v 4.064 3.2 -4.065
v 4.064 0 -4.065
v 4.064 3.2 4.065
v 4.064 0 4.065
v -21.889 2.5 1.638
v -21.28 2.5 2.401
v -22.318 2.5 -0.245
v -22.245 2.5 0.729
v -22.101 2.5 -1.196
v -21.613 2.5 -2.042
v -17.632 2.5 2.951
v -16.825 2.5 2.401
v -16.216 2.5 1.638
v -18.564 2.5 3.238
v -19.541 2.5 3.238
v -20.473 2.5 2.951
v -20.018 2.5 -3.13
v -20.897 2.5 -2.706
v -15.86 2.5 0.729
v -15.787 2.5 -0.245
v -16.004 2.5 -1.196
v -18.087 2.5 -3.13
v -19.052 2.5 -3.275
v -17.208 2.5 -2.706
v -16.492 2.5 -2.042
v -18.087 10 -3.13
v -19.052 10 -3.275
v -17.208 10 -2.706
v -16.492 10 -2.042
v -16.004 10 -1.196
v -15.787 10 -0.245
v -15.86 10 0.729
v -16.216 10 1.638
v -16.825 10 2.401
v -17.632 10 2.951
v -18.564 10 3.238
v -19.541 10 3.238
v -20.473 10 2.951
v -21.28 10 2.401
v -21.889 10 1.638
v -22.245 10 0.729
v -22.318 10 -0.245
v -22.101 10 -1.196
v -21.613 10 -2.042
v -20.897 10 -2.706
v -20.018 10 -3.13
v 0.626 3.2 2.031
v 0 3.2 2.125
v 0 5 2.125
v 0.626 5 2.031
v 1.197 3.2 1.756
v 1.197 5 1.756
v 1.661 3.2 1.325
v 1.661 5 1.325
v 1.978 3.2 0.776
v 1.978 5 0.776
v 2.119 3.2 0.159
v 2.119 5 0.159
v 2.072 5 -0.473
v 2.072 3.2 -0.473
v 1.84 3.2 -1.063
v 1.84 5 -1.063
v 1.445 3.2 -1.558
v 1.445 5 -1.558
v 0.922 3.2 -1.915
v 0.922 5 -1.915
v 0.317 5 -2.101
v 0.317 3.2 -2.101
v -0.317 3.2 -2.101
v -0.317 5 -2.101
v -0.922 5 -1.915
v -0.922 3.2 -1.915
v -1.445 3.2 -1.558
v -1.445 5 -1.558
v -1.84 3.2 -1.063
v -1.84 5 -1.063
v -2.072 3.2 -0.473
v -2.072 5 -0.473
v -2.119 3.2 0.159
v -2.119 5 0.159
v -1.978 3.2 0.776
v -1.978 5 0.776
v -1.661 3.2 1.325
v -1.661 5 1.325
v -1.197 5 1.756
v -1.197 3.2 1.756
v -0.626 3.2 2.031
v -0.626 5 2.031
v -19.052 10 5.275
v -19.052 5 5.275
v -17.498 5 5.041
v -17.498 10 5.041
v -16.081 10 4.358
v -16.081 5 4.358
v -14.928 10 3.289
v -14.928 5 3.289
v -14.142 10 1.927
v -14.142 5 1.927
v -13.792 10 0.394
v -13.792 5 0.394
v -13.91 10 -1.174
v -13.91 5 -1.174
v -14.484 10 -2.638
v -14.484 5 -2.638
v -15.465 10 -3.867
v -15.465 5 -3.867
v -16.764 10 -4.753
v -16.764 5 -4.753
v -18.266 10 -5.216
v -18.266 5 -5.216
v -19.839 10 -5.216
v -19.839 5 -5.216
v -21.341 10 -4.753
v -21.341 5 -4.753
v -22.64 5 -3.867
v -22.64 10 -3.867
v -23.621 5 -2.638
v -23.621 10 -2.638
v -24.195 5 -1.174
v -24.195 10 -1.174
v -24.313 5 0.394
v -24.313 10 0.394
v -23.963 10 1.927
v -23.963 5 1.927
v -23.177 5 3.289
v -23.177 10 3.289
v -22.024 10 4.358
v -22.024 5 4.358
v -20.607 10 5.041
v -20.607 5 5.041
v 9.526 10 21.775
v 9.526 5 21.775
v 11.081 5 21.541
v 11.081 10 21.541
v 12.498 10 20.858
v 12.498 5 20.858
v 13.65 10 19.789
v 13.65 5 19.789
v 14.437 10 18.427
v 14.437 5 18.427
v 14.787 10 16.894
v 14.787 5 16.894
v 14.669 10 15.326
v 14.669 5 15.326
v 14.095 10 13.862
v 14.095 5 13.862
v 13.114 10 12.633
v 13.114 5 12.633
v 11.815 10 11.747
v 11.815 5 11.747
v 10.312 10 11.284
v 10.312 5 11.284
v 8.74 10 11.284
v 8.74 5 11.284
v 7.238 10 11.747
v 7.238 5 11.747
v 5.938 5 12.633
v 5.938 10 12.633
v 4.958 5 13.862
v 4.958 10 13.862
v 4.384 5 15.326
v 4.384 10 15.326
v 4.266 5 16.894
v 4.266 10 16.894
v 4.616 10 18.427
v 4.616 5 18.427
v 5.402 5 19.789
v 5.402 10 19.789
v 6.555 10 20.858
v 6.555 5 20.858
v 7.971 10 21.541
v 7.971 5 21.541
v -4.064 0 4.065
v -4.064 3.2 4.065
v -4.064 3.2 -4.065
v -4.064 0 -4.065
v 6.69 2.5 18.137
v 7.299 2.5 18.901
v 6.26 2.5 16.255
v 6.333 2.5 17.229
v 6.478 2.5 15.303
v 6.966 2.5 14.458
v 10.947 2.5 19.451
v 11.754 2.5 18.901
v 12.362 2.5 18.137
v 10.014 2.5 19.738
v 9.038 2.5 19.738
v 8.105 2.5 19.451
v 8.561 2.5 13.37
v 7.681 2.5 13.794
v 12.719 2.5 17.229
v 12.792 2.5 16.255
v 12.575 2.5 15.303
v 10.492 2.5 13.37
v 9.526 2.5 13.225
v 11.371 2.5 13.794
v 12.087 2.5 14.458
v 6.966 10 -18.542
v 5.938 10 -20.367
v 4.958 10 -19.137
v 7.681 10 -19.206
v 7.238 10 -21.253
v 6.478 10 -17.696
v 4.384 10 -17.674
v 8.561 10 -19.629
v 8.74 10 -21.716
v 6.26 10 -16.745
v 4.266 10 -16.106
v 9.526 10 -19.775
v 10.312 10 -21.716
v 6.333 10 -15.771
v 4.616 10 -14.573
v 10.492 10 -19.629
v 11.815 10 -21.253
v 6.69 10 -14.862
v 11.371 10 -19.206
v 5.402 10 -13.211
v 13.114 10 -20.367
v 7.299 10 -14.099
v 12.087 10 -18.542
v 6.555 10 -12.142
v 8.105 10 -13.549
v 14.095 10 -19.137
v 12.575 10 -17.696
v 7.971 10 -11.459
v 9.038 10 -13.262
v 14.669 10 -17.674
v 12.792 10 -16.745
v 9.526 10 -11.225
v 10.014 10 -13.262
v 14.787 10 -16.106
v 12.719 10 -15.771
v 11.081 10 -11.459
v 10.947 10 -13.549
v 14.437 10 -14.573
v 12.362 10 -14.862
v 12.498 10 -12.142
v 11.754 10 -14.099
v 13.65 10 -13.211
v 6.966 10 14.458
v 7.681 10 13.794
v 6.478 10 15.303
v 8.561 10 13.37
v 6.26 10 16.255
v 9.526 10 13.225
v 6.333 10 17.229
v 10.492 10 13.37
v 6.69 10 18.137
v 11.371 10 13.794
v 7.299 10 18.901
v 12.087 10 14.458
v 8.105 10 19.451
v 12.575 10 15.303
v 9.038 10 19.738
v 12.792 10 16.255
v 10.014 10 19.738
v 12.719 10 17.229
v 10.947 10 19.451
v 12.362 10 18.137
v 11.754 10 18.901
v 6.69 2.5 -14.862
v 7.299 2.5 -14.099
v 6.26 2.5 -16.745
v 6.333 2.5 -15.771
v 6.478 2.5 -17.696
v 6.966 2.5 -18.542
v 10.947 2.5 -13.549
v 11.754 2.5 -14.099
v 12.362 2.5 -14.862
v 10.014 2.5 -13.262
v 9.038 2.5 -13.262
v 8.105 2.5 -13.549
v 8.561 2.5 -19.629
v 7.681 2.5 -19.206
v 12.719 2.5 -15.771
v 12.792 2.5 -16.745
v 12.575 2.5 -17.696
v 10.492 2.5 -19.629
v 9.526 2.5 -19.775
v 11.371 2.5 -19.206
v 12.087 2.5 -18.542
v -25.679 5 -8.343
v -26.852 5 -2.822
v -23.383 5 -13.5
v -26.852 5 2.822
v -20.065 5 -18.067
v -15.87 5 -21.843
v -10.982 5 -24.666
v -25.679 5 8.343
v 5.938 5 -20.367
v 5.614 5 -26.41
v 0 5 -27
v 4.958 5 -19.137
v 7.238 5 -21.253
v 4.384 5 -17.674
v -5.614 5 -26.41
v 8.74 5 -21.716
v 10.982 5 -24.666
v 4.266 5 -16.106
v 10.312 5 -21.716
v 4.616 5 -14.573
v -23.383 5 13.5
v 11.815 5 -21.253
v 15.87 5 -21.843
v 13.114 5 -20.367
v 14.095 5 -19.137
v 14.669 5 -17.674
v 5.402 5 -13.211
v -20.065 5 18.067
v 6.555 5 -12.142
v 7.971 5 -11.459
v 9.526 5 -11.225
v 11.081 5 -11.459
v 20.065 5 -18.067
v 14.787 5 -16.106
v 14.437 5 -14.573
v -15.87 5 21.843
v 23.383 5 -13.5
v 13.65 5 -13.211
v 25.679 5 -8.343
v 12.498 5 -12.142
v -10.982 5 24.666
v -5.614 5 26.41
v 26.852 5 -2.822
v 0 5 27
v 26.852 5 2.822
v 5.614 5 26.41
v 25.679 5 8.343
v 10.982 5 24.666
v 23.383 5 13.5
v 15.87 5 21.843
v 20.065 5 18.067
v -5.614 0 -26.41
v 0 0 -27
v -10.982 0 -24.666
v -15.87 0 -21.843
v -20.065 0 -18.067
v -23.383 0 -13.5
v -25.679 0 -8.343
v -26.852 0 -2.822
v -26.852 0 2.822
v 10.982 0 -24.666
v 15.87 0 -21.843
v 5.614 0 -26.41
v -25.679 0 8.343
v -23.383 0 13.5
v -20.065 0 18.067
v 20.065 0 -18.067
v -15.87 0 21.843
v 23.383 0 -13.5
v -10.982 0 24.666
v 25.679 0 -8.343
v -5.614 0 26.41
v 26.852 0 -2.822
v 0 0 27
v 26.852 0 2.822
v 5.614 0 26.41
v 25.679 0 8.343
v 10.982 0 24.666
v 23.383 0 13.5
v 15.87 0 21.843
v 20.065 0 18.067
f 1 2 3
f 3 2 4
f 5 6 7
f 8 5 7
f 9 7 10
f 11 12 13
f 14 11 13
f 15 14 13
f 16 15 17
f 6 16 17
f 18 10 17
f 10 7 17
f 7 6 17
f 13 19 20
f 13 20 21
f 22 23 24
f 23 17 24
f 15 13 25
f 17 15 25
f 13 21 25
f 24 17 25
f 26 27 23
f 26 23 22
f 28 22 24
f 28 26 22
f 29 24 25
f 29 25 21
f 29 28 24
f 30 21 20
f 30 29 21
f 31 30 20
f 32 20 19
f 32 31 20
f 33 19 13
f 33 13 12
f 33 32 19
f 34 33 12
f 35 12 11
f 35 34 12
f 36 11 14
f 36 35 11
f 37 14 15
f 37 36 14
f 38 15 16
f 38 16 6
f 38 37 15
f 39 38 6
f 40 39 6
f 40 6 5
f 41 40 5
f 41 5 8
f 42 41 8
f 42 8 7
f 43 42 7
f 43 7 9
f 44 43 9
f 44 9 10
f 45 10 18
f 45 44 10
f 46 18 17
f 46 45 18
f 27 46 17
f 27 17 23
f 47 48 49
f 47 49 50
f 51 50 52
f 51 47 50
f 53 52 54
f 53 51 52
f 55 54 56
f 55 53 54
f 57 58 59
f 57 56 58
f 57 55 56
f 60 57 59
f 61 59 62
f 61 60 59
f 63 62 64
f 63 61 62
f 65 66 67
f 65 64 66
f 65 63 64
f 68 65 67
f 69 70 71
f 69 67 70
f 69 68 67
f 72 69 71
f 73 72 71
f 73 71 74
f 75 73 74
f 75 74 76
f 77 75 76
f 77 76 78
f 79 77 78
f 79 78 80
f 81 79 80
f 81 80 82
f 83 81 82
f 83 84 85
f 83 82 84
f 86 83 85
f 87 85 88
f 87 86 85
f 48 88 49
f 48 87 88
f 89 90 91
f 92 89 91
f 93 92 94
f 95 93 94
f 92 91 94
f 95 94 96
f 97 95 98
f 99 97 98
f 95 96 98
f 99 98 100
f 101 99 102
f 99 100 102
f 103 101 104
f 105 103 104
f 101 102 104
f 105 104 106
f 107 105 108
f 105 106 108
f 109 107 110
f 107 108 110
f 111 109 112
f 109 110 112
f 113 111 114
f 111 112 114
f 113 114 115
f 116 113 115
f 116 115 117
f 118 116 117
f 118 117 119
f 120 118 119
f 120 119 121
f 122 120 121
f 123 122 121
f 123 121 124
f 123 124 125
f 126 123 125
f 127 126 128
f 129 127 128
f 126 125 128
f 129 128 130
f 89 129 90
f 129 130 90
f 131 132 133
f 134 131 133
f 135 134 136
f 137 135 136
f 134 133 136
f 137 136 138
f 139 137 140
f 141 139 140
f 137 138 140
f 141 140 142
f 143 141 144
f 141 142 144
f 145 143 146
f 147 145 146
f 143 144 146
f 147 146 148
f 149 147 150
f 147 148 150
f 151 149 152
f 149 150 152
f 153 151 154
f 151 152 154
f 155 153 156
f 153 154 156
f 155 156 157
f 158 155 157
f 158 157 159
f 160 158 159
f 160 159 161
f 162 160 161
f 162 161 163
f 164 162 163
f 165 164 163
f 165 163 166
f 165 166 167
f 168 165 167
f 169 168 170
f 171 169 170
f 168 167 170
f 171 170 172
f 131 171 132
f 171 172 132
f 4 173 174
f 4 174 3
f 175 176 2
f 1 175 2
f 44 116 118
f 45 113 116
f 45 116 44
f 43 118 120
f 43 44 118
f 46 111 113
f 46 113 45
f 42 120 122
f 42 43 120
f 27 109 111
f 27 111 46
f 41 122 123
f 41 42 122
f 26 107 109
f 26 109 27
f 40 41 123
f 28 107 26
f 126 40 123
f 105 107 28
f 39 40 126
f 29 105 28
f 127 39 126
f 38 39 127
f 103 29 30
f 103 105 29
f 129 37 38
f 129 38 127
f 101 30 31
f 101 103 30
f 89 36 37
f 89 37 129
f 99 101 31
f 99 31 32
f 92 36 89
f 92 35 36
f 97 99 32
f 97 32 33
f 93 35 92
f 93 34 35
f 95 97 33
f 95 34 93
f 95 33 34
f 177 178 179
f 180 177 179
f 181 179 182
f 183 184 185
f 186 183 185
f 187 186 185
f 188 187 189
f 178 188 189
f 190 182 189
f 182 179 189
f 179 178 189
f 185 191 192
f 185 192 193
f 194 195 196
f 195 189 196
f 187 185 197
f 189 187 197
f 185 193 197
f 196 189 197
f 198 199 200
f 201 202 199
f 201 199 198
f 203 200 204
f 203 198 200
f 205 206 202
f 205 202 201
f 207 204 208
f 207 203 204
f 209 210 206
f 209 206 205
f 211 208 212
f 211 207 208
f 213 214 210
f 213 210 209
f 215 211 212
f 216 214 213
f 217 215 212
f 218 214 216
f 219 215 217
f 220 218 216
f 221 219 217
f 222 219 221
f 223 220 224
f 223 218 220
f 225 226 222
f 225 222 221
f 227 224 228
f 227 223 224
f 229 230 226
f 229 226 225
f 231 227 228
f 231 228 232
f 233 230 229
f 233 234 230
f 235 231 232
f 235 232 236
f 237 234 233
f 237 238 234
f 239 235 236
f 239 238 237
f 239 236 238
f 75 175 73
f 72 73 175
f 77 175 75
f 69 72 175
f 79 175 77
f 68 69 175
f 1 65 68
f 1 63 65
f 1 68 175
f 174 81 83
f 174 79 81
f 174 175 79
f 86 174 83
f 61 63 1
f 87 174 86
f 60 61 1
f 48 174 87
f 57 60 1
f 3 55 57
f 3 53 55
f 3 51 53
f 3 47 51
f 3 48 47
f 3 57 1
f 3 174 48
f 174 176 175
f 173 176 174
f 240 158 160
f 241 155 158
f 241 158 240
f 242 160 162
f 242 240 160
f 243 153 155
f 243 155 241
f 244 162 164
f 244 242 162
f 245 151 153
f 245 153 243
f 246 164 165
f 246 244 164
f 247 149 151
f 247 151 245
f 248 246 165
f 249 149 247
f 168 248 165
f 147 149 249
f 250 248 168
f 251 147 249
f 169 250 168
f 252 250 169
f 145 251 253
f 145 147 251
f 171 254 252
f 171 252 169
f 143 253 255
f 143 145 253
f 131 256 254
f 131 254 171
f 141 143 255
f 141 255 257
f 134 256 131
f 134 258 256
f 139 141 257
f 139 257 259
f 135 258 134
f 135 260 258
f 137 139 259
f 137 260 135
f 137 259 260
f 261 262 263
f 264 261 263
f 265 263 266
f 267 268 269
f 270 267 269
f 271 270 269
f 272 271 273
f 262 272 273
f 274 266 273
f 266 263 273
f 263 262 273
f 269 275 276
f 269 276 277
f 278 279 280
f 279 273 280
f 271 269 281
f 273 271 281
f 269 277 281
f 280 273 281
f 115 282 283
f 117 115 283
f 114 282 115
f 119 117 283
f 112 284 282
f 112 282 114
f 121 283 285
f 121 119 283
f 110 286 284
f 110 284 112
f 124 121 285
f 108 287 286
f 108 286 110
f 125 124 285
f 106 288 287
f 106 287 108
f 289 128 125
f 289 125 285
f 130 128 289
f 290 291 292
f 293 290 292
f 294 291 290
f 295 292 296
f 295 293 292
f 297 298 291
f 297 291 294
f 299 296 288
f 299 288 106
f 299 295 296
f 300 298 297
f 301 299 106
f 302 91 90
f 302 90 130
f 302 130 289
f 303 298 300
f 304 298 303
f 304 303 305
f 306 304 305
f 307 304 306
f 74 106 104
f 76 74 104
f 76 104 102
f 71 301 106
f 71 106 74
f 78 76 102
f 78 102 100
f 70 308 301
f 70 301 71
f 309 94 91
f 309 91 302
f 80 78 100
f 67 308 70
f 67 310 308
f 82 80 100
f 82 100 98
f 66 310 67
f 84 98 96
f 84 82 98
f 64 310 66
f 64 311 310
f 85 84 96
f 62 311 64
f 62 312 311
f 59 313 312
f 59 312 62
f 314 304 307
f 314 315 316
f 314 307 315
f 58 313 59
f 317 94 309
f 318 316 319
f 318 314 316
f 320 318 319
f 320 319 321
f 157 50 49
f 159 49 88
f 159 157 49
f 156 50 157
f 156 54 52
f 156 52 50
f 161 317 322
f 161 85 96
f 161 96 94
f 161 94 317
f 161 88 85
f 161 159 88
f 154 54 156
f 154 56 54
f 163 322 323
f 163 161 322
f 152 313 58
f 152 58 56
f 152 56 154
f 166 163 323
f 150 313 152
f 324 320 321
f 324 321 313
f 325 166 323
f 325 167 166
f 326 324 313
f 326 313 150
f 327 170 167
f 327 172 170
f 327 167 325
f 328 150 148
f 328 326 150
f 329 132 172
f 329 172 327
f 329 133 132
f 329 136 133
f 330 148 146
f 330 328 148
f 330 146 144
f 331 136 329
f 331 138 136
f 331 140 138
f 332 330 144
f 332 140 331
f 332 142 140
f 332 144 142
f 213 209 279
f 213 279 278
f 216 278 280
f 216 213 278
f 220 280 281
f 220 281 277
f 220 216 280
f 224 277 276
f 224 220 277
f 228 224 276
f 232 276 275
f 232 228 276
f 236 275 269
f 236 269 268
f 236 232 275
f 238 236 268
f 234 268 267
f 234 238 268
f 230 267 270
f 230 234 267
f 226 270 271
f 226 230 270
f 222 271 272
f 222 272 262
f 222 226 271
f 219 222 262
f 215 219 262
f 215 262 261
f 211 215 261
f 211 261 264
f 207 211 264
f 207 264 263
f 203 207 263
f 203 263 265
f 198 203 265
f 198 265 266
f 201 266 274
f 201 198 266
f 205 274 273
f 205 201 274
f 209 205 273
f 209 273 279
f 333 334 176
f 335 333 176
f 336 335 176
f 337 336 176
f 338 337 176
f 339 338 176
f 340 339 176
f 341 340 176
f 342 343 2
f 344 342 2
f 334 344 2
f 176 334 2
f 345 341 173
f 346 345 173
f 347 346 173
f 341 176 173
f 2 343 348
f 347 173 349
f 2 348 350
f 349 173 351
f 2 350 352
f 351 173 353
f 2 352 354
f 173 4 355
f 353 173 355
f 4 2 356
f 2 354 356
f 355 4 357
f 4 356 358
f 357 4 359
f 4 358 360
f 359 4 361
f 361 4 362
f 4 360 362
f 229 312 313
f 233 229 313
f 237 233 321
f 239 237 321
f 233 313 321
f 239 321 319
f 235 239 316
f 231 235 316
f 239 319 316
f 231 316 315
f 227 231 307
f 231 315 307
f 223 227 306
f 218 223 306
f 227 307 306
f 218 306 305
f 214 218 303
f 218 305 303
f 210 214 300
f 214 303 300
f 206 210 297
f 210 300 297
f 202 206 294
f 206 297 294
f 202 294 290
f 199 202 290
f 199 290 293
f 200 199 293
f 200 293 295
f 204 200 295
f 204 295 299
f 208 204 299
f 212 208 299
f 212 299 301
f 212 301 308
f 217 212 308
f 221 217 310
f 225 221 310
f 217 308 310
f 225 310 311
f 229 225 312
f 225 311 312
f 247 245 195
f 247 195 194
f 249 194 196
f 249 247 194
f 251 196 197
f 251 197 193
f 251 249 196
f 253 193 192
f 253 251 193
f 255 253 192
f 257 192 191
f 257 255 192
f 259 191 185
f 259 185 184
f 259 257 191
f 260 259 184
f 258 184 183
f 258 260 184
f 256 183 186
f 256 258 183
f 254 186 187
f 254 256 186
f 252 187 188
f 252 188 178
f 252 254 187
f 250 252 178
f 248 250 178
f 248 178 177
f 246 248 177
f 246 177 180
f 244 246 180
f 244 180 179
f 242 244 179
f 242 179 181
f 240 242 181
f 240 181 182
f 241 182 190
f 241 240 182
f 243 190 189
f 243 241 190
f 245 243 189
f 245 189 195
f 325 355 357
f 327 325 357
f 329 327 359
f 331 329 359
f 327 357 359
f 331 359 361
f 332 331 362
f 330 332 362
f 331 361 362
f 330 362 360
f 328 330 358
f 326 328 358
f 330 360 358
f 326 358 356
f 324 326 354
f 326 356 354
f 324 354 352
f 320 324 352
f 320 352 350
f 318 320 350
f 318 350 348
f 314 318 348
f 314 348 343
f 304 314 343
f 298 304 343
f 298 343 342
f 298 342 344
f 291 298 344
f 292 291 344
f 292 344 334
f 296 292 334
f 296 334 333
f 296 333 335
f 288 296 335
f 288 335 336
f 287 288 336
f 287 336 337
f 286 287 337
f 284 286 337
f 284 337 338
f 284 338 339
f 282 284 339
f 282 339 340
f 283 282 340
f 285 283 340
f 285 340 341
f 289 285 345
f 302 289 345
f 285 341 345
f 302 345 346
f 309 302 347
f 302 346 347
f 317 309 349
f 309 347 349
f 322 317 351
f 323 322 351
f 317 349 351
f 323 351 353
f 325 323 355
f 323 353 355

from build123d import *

# Parameters (mm, degrees)
SKETCH2_R           = 27
SKETCH2_R_2         = 2.125
BOSS_EXTRUDE2_DEPTH = 10
SKETCH3_R           = 3.275
CUT_EXTRUDE1_DEPTH  = 7.5
CUT_EXTRUDE2_START  = -5
SKETCH4_R           = 27
SKETCH4_R_2         = 5.275
CUT_EXTRUDE2_DEPTH  = 5
SKETCH5_W           = 8.128
SKETCH5_H           = 8.13
CUT_EXTRUDE3_DEPTH  = 3.2


with BuildPart() as part:
    # Sketch2 → Boss-Extrude2 (new body)
    with BuildSketch(Plane(origin=(0, 0, 0), x_dir=(1, 0, 0), z_dir=(0, 1, 0))):
        with Locations(Location((0, 0, 0), (0, 0, 270))):
            Circle(SKETCH2_R)
        with Locations(Location((0, 0, 0), (0, 0, 270))):
            Circle(SKETCH2_R_2, mode=Mode.SUBTRACT)
    extrude(amount=BOSS_EXTRUDE2_DEPTH)

    # Sketch3 → Cut-Extrude1 (cut)
    with BuildSketch(Plane.XZ.offset(-10)):
        with Locations(Location((9.52625, -16.499949006, 0), (0, 0, 270))):
            Circle(SKETCH3_R)
        with Locations(Location((9.52625, 16.499949006, 0), (0, 0, 270))):
            Circle(SKETCH3_R)
        with Locations(Location((-19.0525, 0, 0), (0, 0, 270))):
            Circle(SKETCH3_R)
    extrude(amount=CUT_EXTRUDE1_DEPTH, mode=Mode.SUBTRACT)

    # Sketch4 → Cut-Extrude2 (cut)
    with BuildSketch(Plane(origin=(0, 10, 0), x_dir=(1, 0, 0), z_dir=(0, 1, 0)).offset(CUT_EXTRUDE2_START)):
        with Locations(Location((0, 0, 0), (0, 0, 270))):
            Circle(SKETCH4_R)
        with Locations(Location((-19.0525, 0, 0), (0, 0, 270))):
            Circle(SKETCH4_R_2, mode=Mode.SUBTRACT)
        with Locations(Location((9.52625, -16.499949006, 0), (0, 0, 270))):
            Circle(SKETCH4_R_2, mode=Mode.SUBTRACT)
        with Locations(Location((9.52625, 16.499949006, 0), (0, 0, 270))):
            Circle(SKETCH4_R_2, mode=Mode.SUBTRACT)
    extrude(amount=CUT_EXTRUDE2_DEPTH, mode=Mode.SUBTRACT)

    # Sketch5 → Cut-Extrude3 (cut)
    with BuildSketch(Plane.XZ):
        Rectangle(SKETCH5_W, SKETCH5_H)
    extrude(amount=-CUT_EXTRUDE3_DEPTH, mode=Mode.SUBTRACT)


solid = part.part
